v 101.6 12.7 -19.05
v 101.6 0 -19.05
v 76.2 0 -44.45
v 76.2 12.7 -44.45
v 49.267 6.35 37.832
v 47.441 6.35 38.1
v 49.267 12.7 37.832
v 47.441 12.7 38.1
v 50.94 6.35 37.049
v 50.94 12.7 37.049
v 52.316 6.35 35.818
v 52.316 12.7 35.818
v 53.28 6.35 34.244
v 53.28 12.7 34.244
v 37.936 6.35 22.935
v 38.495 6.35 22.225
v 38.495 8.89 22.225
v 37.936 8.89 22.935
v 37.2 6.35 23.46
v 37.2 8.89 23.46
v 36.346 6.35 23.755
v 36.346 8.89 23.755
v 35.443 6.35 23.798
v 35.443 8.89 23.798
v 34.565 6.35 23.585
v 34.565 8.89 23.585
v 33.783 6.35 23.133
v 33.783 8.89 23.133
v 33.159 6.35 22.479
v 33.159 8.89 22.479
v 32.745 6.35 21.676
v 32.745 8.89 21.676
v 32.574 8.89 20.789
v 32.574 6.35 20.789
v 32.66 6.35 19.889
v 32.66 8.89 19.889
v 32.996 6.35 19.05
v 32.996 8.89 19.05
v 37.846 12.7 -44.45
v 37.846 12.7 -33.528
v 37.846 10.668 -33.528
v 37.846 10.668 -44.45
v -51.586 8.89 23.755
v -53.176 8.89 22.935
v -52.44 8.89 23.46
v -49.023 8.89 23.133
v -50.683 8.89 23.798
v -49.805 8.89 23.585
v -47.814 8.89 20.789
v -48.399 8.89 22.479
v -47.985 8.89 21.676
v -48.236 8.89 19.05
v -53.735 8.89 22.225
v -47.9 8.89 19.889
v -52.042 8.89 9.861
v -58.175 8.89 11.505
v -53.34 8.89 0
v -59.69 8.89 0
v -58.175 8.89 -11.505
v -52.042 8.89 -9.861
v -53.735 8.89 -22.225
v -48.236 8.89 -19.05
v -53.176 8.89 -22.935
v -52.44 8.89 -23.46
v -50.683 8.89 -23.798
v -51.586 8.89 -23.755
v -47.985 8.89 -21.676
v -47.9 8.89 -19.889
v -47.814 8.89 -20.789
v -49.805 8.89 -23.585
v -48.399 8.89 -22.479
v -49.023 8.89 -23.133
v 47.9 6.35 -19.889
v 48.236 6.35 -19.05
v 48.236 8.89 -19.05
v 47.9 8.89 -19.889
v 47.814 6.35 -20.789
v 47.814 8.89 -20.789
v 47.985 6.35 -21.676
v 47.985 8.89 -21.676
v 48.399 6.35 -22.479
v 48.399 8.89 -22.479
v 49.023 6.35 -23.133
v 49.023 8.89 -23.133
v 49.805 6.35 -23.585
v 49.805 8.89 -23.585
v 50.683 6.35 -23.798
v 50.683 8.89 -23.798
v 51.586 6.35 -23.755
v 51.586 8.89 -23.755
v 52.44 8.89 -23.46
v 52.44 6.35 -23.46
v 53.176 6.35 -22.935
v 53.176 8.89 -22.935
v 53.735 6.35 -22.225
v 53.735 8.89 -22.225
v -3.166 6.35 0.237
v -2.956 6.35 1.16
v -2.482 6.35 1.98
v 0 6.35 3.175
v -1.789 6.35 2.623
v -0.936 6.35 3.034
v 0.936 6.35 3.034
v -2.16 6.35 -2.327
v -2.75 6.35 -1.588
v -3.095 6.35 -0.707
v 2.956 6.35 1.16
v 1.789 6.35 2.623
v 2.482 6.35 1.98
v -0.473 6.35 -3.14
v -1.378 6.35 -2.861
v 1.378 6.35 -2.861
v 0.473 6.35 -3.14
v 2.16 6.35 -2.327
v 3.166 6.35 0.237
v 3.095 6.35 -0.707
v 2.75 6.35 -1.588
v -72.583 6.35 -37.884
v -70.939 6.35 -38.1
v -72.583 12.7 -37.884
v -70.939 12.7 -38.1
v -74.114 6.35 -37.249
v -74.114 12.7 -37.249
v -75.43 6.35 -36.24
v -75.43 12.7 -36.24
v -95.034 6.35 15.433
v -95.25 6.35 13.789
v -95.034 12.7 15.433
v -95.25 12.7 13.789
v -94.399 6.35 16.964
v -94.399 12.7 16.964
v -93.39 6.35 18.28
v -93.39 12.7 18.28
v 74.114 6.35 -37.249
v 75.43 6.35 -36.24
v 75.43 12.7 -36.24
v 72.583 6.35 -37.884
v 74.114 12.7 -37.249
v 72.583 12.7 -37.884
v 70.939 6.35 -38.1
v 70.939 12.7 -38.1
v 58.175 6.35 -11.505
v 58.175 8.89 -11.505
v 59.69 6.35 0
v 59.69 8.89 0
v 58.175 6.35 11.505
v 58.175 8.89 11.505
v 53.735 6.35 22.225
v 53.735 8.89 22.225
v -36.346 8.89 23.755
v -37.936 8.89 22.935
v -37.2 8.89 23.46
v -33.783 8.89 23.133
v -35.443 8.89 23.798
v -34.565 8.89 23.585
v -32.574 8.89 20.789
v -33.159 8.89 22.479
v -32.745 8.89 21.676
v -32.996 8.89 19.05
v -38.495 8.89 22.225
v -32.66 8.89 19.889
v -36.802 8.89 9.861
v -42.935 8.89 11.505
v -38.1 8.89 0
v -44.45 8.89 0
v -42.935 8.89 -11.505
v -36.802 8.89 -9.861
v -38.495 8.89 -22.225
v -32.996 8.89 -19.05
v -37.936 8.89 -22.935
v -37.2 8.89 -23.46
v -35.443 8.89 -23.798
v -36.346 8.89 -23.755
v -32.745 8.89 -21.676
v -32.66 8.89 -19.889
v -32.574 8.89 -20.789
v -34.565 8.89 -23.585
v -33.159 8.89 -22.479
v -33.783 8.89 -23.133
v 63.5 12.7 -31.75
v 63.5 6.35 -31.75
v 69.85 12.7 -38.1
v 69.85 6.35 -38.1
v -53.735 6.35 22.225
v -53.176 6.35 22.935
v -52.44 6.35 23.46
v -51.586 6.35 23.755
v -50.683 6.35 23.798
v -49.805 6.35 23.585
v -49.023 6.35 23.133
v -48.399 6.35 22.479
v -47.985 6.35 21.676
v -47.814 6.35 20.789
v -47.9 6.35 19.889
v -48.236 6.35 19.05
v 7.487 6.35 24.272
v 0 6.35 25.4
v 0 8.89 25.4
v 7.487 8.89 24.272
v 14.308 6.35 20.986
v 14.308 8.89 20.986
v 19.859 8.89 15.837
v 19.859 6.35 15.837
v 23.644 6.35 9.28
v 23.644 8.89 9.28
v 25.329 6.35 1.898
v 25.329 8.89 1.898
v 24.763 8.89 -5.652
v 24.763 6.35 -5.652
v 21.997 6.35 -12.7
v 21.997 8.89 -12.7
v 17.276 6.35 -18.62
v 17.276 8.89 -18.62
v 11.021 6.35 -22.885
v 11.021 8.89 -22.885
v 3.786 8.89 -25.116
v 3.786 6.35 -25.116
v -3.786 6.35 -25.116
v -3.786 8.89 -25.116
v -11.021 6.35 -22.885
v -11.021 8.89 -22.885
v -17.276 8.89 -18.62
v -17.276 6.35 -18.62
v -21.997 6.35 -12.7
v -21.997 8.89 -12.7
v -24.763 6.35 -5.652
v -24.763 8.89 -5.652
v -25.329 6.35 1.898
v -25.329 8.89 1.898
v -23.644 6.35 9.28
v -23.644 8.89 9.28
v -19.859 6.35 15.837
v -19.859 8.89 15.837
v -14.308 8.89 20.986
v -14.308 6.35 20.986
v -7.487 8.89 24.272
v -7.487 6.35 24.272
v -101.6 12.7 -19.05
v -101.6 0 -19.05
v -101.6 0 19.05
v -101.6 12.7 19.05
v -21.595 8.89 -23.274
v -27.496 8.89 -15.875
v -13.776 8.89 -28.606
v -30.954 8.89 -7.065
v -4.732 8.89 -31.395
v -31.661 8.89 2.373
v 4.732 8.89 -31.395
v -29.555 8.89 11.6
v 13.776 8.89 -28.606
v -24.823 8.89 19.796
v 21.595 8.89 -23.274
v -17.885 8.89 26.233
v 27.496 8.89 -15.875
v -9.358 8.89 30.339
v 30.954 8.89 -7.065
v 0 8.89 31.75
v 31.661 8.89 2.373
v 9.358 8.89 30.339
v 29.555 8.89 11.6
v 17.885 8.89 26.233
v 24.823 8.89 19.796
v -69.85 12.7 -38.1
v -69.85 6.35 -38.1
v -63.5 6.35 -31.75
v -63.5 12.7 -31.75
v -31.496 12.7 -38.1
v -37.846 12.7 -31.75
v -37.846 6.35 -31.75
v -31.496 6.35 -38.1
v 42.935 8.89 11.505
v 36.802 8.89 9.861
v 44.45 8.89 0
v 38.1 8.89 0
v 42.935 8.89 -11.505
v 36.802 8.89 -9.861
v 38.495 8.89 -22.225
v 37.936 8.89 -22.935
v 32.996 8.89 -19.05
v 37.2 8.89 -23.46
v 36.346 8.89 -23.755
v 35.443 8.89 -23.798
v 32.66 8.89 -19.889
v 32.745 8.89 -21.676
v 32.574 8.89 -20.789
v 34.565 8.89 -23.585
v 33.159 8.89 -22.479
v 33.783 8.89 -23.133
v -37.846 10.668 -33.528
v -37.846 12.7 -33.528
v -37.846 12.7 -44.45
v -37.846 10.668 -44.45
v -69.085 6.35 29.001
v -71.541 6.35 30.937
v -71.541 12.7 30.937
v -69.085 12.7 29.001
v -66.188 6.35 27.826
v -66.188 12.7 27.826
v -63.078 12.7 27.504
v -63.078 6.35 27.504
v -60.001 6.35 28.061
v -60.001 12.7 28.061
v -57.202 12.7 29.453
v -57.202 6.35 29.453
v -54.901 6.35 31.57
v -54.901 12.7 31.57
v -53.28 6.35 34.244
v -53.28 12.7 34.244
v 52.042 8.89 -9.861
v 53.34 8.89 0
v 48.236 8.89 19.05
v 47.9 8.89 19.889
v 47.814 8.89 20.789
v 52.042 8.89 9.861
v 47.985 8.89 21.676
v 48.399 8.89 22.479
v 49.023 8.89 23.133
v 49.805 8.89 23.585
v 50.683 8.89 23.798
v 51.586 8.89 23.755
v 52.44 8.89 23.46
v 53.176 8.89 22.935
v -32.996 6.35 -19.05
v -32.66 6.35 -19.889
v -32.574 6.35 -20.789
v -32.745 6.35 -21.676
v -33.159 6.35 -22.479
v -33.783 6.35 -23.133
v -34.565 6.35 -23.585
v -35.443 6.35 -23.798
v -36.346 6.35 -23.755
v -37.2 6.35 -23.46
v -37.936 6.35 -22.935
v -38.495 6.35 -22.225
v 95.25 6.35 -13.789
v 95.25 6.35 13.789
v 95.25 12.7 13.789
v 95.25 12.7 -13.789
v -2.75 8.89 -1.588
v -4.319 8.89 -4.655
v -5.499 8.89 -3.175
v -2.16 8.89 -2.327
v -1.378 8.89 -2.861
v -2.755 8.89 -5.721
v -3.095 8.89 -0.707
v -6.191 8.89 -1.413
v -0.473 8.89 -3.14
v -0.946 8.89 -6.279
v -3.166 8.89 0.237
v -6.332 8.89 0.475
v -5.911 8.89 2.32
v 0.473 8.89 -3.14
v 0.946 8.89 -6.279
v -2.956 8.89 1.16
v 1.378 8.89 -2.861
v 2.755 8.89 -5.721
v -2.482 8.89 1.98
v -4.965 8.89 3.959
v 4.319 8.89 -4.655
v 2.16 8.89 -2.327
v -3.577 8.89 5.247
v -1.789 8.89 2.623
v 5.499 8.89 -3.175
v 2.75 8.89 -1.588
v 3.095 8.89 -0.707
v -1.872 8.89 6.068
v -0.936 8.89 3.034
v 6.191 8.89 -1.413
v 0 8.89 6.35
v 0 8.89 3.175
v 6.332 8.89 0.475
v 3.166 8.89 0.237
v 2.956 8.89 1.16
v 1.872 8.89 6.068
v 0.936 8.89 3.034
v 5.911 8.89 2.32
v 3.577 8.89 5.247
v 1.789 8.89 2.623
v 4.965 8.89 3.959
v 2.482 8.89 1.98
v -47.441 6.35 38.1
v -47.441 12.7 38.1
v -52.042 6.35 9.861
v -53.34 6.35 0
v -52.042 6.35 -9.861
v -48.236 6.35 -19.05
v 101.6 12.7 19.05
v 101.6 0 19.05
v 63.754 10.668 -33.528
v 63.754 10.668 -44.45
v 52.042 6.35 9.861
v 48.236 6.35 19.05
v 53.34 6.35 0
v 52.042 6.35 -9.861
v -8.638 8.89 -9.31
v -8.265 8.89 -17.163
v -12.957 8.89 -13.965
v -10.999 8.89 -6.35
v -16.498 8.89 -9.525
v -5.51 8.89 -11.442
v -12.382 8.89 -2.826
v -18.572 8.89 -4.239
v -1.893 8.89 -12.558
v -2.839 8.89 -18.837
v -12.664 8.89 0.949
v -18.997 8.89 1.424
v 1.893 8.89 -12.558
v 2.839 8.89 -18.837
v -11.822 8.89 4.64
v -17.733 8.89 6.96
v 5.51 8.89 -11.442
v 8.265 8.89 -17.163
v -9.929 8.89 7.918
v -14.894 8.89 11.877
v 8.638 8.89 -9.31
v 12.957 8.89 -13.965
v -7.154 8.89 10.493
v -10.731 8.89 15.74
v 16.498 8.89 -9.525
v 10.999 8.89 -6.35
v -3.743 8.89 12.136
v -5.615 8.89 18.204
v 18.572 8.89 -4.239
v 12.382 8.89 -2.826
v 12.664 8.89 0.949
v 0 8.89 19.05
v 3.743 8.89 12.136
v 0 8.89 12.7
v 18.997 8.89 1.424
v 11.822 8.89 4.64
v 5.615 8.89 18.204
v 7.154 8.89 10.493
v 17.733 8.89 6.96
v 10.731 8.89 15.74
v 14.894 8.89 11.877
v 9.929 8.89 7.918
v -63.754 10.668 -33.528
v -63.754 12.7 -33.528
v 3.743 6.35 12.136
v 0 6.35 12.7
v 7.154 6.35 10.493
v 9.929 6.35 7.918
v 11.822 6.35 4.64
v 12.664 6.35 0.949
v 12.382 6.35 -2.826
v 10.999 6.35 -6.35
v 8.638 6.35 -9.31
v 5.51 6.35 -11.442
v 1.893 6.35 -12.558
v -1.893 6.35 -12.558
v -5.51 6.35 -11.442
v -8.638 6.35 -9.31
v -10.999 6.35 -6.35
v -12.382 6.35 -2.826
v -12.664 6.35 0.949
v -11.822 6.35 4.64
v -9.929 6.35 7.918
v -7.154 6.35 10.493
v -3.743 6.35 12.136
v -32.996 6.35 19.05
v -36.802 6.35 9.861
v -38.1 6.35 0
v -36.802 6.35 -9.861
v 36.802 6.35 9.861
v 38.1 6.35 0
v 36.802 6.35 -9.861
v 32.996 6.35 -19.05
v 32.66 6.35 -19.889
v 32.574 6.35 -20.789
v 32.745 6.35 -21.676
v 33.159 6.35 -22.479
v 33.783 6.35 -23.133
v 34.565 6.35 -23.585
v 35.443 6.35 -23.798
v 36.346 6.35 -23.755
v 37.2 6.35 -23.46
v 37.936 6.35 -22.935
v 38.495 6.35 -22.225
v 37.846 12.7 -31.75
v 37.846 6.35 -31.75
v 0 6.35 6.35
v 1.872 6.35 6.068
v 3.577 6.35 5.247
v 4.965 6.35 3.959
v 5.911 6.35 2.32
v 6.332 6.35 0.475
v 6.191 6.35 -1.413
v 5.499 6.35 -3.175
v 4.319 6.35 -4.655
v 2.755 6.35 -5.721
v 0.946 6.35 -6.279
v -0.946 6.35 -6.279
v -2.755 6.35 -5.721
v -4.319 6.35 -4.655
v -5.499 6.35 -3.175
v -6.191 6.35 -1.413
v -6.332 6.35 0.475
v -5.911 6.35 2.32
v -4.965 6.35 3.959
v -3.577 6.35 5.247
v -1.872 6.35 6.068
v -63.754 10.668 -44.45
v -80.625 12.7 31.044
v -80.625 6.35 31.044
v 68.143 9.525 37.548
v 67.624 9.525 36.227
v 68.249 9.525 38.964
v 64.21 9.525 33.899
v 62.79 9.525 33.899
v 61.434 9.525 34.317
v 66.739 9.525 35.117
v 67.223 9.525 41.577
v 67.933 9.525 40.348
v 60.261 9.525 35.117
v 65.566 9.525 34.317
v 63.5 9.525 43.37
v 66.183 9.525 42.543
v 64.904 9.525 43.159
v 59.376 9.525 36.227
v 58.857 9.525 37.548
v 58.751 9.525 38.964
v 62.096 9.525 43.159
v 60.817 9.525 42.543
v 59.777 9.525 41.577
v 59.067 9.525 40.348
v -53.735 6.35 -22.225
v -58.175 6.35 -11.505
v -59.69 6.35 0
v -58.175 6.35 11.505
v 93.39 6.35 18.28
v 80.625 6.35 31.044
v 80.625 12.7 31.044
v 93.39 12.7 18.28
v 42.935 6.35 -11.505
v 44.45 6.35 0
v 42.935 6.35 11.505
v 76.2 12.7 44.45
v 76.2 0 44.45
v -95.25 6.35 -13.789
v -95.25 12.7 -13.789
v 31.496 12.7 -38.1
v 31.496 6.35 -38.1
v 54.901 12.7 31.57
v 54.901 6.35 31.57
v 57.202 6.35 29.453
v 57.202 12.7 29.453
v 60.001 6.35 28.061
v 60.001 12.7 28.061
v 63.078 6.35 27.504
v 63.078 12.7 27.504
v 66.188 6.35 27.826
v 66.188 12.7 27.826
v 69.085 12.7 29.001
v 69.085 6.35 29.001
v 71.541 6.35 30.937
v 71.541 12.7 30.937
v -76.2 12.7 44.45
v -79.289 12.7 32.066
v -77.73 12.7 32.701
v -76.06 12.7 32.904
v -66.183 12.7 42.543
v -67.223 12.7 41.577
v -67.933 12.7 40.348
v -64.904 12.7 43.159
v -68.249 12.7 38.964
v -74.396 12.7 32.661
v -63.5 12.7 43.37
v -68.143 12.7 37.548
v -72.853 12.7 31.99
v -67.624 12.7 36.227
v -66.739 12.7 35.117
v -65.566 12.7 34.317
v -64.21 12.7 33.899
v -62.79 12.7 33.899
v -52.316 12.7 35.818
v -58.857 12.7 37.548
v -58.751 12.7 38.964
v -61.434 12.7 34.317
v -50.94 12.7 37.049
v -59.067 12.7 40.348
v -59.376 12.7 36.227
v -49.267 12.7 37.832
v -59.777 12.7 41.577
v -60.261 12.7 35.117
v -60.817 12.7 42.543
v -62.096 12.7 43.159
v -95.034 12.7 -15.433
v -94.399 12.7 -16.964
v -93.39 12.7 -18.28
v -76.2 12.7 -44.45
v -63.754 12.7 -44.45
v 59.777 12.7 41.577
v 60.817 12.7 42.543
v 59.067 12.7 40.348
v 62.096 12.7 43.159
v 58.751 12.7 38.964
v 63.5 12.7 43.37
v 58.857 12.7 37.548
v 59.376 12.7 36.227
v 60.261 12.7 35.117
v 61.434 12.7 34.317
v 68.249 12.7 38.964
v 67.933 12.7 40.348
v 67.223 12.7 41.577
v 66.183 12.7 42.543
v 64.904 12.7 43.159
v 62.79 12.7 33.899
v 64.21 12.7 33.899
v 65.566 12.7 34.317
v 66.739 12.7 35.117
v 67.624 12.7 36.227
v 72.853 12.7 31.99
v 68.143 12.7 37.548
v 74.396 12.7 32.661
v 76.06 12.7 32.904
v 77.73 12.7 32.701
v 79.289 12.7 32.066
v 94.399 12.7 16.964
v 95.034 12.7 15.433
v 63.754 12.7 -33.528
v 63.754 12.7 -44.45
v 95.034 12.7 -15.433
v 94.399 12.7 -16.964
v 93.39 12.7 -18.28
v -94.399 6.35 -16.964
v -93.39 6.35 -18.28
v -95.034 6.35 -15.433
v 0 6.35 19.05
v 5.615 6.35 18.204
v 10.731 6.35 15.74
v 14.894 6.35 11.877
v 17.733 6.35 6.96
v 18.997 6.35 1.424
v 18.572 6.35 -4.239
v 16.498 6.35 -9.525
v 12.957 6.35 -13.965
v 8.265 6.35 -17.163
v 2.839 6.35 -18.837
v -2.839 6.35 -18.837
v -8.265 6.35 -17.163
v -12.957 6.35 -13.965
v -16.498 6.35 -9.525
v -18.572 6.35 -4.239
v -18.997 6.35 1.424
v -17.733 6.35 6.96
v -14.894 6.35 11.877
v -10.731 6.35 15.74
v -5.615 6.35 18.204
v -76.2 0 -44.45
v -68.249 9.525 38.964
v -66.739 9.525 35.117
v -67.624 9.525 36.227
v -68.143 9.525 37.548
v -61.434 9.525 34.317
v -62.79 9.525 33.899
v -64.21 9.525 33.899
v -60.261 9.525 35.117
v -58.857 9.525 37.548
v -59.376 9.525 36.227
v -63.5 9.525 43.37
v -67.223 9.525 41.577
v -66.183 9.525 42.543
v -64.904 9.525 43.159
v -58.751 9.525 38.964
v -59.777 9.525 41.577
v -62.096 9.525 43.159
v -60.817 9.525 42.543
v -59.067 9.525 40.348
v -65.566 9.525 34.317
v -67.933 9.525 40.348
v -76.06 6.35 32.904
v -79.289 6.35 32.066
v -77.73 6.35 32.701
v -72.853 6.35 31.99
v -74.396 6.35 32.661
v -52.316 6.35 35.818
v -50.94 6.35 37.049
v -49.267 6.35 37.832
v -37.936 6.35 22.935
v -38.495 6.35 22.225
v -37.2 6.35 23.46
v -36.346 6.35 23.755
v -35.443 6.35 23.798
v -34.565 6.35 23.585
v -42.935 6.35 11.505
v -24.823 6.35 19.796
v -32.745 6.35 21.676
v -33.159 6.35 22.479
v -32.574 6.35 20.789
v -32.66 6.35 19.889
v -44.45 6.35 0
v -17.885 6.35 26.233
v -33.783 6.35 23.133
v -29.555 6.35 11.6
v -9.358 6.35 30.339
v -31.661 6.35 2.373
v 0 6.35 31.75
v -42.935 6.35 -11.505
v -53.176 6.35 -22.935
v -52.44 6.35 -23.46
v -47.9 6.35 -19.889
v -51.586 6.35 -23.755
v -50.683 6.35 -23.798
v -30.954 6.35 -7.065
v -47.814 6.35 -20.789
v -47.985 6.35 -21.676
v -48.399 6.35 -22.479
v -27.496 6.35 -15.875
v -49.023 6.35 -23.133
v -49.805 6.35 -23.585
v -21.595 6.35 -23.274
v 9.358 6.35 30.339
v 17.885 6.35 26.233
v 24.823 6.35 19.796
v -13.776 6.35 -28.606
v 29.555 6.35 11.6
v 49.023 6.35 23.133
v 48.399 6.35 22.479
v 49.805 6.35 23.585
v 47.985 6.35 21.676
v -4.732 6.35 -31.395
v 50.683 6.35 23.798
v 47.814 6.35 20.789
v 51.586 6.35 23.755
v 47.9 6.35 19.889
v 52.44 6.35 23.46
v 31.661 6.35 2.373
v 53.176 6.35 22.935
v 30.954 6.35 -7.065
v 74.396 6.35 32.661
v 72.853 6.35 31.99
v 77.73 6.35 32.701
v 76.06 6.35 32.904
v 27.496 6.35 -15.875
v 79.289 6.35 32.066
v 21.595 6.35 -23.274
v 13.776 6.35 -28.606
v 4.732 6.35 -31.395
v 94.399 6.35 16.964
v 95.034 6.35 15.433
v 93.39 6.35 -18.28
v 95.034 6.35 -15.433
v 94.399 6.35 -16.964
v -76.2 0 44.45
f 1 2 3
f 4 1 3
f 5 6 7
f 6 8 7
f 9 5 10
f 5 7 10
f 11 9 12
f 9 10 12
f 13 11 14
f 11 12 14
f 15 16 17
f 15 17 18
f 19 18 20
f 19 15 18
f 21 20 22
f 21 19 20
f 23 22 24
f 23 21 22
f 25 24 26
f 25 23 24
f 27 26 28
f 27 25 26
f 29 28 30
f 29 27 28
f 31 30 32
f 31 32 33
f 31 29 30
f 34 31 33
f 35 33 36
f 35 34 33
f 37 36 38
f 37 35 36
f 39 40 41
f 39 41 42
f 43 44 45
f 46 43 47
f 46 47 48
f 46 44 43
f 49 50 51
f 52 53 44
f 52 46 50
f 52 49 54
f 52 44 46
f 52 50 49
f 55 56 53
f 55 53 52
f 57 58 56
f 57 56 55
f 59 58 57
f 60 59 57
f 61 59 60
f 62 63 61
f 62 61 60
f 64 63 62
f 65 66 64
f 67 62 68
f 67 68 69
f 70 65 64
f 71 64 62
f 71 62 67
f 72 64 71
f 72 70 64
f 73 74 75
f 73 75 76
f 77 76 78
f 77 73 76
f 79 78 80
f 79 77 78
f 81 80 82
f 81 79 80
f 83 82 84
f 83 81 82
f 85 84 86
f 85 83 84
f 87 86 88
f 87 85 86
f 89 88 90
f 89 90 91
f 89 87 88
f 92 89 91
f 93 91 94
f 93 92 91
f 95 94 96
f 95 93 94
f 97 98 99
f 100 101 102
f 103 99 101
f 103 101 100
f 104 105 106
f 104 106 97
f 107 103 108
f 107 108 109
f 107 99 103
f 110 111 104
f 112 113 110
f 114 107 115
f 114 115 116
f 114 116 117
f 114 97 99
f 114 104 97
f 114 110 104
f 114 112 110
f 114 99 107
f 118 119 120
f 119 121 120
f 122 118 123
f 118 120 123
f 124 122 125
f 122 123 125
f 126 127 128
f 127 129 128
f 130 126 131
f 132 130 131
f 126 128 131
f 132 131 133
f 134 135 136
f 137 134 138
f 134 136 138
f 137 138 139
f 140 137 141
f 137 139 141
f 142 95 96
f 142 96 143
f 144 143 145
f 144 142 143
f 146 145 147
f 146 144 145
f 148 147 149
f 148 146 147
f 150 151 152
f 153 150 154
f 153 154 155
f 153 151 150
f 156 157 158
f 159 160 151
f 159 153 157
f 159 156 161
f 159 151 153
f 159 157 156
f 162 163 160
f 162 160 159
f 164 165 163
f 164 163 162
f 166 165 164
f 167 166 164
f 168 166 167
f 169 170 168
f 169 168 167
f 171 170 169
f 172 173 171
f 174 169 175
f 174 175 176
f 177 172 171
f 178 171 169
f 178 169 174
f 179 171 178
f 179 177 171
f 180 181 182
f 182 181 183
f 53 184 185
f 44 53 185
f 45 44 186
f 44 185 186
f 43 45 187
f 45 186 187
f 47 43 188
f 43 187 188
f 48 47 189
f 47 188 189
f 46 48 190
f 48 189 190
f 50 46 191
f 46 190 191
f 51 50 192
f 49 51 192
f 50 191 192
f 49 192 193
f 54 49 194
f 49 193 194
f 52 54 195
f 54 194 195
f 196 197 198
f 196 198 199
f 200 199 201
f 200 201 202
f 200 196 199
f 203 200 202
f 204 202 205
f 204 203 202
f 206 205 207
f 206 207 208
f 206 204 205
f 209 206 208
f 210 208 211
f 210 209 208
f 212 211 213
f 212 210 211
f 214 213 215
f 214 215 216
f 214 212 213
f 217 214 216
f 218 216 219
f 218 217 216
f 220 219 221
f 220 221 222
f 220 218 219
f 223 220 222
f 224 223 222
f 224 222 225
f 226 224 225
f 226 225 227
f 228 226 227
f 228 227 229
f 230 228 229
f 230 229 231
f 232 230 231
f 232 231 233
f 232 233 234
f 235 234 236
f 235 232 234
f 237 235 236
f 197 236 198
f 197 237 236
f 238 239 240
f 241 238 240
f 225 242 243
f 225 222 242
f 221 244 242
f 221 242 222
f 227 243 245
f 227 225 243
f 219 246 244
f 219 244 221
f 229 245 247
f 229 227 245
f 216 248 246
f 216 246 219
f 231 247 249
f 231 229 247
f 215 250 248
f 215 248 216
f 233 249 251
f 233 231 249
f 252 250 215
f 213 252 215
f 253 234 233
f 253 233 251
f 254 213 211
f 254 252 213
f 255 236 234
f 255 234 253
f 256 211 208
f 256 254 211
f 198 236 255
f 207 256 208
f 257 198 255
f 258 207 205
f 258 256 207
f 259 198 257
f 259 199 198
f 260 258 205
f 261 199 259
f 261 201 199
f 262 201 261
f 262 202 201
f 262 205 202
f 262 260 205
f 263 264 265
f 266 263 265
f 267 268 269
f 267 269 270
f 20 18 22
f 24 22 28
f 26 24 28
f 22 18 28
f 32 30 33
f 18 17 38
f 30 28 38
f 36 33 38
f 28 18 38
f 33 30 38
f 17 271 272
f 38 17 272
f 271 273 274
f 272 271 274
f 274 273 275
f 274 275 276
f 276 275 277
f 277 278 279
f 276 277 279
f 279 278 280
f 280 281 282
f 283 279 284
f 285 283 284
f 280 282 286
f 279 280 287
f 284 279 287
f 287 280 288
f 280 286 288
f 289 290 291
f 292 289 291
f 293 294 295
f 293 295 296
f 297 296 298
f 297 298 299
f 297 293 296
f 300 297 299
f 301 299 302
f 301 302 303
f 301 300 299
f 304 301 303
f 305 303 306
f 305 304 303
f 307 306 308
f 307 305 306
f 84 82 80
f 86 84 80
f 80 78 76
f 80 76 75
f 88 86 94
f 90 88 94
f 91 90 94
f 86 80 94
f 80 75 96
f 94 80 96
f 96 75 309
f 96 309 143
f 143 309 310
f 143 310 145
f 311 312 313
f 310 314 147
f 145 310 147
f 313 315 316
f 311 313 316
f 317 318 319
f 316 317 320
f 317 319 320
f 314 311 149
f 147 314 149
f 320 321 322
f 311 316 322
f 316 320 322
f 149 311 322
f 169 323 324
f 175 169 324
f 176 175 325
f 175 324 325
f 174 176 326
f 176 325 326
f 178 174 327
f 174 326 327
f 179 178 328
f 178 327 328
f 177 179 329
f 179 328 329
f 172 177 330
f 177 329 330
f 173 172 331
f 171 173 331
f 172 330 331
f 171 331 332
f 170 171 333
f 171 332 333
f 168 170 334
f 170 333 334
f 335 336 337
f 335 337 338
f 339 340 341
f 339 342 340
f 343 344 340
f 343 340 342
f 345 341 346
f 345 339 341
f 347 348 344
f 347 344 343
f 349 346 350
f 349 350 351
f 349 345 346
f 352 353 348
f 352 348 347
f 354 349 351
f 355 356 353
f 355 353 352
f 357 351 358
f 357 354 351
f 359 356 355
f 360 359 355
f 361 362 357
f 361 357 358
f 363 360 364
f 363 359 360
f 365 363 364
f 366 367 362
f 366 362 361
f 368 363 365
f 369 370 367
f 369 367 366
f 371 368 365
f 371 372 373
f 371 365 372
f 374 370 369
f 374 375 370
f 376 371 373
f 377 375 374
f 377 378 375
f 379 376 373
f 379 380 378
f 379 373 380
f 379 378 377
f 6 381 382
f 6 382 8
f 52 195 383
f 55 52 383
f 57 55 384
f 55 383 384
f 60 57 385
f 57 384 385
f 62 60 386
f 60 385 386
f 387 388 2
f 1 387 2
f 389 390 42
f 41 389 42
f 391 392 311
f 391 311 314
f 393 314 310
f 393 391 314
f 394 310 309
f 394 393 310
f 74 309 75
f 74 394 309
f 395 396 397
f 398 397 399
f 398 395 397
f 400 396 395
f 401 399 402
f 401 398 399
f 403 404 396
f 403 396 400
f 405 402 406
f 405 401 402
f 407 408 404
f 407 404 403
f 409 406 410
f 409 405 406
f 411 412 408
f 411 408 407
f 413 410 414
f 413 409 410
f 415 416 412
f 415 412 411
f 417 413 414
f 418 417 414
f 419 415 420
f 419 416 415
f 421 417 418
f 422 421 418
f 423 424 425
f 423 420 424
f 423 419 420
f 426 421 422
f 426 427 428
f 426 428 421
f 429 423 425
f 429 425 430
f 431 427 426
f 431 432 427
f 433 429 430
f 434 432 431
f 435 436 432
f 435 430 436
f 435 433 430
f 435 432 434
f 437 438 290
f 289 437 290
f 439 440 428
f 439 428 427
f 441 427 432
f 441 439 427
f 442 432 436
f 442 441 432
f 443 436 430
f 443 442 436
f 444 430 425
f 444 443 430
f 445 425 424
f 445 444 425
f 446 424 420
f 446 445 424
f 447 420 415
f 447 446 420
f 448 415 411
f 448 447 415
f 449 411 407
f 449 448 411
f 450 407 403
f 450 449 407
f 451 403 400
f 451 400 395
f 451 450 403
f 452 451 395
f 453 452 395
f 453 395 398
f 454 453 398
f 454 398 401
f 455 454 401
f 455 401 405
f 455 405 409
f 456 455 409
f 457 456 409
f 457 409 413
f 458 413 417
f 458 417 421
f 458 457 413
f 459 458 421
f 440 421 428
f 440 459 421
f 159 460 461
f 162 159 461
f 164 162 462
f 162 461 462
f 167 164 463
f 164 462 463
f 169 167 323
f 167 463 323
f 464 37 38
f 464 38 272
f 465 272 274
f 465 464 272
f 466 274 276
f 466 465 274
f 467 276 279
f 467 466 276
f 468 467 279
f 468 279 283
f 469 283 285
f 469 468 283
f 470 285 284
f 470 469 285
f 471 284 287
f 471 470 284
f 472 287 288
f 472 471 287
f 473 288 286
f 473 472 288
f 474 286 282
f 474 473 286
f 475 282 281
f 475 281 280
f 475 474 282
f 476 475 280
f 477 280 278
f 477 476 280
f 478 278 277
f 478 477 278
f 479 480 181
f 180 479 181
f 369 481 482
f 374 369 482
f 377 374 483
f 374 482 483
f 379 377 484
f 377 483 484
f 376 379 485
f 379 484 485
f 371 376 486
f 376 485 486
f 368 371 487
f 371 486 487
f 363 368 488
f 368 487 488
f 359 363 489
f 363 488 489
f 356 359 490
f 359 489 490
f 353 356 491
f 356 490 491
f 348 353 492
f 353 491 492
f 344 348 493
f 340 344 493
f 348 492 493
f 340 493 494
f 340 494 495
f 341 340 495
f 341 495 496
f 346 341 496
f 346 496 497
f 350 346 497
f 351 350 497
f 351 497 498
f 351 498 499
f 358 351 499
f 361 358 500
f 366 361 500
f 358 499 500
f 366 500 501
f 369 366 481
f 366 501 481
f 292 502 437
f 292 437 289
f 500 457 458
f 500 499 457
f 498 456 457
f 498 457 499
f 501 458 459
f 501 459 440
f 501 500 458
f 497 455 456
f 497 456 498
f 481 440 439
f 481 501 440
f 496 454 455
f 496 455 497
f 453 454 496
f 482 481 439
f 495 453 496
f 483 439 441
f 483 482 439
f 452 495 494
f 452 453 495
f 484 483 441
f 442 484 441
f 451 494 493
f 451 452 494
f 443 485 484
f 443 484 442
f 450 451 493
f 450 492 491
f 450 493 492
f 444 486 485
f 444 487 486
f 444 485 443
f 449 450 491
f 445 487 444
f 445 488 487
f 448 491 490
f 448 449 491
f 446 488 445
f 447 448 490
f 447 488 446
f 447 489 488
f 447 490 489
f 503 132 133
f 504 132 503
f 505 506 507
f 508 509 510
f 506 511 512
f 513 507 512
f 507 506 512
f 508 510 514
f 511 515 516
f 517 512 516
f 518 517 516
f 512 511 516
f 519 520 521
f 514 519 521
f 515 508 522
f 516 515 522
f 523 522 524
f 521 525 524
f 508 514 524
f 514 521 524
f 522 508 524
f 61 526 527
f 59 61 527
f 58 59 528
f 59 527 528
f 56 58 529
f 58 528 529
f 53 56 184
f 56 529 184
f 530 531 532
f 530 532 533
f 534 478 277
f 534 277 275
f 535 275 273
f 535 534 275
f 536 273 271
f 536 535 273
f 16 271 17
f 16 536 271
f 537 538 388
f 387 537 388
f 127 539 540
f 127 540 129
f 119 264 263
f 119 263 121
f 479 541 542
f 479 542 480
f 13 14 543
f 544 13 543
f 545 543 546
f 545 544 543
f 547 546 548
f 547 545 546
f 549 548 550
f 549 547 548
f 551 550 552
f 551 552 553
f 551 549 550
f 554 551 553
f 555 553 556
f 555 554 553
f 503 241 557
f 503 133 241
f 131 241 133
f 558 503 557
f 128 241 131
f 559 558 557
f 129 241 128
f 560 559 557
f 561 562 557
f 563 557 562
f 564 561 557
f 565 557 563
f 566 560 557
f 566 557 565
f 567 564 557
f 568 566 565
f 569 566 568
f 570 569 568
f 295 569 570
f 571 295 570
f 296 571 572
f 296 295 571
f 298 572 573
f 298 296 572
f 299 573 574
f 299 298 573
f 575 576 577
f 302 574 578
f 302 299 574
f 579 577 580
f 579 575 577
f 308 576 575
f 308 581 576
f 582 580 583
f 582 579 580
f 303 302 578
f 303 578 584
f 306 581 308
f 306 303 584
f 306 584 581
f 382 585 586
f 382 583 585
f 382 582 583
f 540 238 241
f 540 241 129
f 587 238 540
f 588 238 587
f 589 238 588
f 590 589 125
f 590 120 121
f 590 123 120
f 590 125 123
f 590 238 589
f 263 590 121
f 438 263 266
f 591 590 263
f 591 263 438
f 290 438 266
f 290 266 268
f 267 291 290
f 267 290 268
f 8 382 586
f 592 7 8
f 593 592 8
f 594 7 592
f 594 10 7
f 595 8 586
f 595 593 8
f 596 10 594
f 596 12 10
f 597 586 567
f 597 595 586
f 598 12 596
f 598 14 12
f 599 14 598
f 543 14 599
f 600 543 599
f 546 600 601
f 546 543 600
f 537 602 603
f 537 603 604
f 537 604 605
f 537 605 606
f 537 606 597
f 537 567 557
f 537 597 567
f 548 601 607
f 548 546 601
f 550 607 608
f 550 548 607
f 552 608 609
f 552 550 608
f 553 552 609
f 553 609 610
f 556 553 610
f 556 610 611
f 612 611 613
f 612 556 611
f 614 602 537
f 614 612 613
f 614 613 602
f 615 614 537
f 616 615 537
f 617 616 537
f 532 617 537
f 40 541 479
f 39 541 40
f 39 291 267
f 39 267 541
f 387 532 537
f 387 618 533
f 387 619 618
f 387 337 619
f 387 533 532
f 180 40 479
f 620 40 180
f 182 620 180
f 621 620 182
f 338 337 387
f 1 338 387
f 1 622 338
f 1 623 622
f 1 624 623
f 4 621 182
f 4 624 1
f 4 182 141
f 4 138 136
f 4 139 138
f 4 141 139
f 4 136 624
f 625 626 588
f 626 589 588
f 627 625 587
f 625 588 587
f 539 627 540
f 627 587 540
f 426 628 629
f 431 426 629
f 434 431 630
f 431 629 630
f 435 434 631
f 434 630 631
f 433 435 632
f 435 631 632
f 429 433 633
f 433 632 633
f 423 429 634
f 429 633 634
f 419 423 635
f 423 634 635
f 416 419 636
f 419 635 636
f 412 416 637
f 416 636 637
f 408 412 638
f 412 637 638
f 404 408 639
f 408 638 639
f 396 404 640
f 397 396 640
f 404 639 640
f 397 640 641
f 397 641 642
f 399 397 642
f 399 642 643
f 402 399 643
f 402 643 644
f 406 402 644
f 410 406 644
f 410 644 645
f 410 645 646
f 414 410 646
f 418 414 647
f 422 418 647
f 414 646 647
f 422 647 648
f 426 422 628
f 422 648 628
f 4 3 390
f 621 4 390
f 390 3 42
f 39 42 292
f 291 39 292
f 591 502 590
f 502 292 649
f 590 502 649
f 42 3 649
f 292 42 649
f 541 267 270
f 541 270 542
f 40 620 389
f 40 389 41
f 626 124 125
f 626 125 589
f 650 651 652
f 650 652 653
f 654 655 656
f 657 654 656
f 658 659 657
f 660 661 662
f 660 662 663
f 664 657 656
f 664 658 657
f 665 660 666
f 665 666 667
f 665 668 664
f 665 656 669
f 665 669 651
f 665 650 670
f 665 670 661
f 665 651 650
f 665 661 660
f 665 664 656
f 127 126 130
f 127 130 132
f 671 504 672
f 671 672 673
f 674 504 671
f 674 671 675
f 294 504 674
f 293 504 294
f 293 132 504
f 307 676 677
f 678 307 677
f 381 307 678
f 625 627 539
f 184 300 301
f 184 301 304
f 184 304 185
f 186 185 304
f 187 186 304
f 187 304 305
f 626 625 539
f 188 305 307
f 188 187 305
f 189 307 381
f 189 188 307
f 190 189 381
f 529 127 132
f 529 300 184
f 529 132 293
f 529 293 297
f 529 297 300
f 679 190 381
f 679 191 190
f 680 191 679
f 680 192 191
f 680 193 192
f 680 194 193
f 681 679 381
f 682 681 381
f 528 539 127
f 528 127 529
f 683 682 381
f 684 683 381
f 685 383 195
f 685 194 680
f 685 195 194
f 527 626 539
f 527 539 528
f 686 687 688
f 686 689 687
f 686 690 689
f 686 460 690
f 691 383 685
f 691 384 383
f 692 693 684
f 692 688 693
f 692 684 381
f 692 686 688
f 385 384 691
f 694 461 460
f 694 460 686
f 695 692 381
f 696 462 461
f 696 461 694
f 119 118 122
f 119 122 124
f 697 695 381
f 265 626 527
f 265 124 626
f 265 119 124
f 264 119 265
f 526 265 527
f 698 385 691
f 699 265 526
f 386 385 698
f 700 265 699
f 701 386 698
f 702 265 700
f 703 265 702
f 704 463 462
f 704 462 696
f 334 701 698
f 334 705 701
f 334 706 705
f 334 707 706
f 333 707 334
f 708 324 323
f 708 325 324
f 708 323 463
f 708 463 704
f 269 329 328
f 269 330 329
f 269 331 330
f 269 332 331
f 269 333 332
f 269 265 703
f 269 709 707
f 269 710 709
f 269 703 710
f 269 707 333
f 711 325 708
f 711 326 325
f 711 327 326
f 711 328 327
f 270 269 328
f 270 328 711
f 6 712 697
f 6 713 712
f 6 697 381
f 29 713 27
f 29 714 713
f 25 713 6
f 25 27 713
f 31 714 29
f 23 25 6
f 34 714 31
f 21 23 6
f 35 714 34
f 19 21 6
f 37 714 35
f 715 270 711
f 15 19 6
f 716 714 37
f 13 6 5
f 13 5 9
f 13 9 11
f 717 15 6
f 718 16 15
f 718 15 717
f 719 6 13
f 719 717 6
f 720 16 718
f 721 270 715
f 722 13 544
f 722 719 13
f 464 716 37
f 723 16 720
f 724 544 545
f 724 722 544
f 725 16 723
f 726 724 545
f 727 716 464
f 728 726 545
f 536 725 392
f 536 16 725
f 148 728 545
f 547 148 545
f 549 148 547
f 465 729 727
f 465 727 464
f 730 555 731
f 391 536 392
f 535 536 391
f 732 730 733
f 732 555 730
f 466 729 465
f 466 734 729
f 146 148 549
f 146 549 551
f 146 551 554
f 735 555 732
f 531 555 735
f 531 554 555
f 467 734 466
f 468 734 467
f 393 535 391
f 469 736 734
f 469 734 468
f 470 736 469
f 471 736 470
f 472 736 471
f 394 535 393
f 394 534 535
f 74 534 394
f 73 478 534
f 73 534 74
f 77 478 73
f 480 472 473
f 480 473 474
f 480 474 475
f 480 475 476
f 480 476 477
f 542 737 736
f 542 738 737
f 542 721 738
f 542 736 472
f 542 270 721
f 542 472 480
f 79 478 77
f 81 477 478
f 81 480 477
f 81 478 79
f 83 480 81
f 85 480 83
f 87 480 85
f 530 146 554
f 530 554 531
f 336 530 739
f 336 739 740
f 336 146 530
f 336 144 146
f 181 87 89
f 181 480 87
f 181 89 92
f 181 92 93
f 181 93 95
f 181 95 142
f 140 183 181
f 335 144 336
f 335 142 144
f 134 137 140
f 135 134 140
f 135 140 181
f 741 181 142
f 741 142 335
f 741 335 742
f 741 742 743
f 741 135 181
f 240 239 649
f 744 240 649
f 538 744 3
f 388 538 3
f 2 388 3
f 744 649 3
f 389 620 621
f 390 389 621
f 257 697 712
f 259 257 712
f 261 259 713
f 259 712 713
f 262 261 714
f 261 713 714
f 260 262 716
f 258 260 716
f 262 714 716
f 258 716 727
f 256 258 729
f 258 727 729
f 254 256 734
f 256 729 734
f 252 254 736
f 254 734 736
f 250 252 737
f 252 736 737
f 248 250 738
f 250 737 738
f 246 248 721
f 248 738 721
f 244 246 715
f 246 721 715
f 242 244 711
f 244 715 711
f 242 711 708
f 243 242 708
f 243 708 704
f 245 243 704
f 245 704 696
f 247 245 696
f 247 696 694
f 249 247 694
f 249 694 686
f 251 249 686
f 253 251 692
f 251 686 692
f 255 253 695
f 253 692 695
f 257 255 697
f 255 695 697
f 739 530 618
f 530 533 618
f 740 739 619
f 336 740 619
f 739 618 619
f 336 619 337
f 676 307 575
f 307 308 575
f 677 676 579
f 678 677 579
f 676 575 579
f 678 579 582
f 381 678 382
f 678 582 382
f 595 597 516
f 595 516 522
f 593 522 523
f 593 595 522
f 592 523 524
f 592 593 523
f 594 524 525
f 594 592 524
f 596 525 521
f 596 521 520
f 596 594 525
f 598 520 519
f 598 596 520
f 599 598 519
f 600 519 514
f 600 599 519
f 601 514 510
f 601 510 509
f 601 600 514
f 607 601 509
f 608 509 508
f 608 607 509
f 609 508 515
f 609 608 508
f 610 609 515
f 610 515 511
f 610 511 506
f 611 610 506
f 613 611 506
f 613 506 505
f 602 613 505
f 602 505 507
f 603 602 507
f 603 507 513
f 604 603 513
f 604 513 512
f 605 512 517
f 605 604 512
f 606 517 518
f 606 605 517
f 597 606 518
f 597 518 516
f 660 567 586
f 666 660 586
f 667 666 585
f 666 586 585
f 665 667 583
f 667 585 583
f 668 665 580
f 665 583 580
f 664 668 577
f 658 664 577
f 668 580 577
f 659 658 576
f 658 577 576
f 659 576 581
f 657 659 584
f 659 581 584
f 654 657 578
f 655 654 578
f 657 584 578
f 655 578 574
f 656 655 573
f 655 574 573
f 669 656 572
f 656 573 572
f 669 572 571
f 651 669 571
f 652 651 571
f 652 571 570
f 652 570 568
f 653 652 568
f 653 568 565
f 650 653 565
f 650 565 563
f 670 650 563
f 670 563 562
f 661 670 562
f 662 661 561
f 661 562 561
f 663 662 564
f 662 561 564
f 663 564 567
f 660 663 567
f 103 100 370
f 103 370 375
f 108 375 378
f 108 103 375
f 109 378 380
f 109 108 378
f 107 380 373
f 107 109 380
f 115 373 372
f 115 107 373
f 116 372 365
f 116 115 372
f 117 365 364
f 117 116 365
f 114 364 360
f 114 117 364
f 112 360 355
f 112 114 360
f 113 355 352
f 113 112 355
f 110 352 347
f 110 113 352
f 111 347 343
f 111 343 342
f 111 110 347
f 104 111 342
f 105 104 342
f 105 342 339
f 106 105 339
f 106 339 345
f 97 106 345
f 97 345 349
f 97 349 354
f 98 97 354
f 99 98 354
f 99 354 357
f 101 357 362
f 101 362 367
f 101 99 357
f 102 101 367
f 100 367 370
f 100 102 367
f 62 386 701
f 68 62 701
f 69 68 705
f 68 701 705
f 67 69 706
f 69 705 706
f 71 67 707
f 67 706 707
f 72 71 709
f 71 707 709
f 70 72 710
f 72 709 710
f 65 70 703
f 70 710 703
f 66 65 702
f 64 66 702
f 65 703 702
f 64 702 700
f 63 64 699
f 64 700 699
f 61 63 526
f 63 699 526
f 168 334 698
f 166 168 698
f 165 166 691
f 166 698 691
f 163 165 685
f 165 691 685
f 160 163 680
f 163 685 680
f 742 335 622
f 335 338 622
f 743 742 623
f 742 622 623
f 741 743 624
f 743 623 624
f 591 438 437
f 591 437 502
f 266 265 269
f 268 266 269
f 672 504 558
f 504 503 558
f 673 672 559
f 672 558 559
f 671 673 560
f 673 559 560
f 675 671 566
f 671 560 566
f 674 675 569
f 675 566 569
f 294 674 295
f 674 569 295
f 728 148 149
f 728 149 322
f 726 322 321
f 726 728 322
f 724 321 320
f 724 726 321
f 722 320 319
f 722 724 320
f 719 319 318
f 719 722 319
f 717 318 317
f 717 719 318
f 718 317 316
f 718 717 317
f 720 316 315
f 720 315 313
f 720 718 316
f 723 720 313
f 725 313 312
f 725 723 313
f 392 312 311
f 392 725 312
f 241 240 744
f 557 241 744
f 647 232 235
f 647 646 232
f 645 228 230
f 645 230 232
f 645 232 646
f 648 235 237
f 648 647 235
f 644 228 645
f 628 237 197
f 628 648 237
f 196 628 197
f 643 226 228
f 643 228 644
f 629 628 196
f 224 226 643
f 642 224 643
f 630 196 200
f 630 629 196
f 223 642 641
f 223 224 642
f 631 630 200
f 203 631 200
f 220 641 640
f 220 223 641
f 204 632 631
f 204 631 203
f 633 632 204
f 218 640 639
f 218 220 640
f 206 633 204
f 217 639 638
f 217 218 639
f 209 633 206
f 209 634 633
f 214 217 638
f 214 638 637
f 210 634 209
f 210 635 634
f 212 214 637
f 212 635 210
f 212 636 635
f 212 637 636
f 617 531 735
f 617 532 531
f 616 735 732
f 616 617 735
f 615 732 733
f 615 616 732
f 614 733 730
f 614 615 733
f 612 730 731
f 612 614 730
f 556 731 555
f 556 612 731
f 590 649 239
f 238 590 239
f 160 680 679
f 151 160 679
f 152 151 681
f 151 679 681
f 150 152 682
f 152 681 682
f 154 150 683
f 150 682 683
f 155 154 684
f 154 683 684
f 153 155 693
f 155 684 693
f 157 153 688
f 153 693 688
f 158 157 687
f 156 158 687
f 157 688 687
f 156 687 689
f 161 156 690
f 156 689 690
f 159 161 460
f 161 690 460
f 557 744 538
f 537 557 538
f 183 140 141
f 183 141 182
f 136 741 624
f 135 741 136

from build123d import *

# Parameters (mm, degrees)
BOSS_EXTRUDE1_DEPTH  = 12.7
SKETCH2_R            = 4.7625
CUT_EXTRUDE1_DEPTH   = 3.175
SHELL2_START         = 6.35
SHELL2_DEPTH         = 6.35
FILLET3_R            = 6.35
BOSS_EXTRUDE2_DEPTH  = 6.35
CUT_EXTRUDE2_START   = 6.35
SKETCH4_W            = 25.908
SKETCH4_H            = 10.922
CUT_EXTRUDE2_DEPTH   = 2.032
CUT_EXTRUDE3_DEPTH   = 6.35
SKETCH6_R            = 31.75
SKETCH6_R_2          = 25.4
BOSS_EXTRUDE3_DEPTH  = 2.54
SKETCH7_R            = 19.05
SKETCH7_R_2          = 12.7
BOSS_EXTRUDE4_DEPTH  = 2.54
SKETCH8_R            = 6.35
SKETCH8_R_2          = 3.175
BOSS_EXTRUDE5_DEPTH  = 2.54
BOSS_EXTRUDE6_DEPTH  = 2.54
LPATTERN1_COUNT      = 2
LPATTERN1_PITCH      = 15.24
MIRROR3_COPY_1_DEPTH = 2.54


# Read off the part's stored shape, not the designer's step: Shell2
with BuildPart() as part:
    # Sketch1 → Boss-Extrude1 (new body)
    with BuildSketch(Plane(origin=(0, 0, 0), x_dir=(1, 0, 0), z_dir=(0, 1, 0))):
        Polygon((-76.2, 44.45), (-101.6, 19.05), (-101.6, -19.05), (-76.2, -44.45), (76.2, -44.45), (101.6, -19.05), (101.6, 19.05), (76.2, 44.45), align=None)
    extrude(amount=BOSS_EXTRUDE1_DEPTH)

    # Sketch2 → Cut-Extrude1 (cut)
    with BuildSketch(Plane(origin=(0, 12.7, 0), x_dir=(1, 0, 0), z_dir=(0, 1, 0))):
        with Locations(Location((-63.5, -38.608, 0), (0, 0, 270))):
            Circle(SKETCH2_R)
    cut_extrude1 = extrude(amount=-CUT_EXTRUDE1_DEPTH, mode=Mode.SUBTRACT)

    # Mirror1: Cut-Extrude1 across plane
    add(cut_extrude1.mirror(Plane(origin=(0, 0, 0), x_dir=(0, 0, 1), z_dir=(1, 0, 0))), mode=Mode.SUBTRACT)

    # Shell2 outline → Shell2 (cut)
    with BuildSketch(Plane(origin=(0, 0, 0), x_dir=(1, 0, 0), z_dir=(0, 1, 0)).offset(SHELL2_START)):
        with BuildLine():
            Line((74.516823481, -37.152920398), (95.25, -16.419743879))
            Line((95.25, -16.419743879), (95.25, 16.419743879))
            Line((95.25, 16.419743879), (73.569743879, 38.1))
            Line((73.569743879, 38.1), (-73.569743879, 38.1))
            Line((-73.569743879, 38.1), (-95.25, 16.419743879))
            Line((-95.25, 16.419743879), (-95.25, -16.419743879))
            Line((-95.25, -16.419743879), (-74.516823481, -37.152920398))
            ThreePointArc((-74.516823481, -37.152920398), (-63.024598672, -27.505673675), (-52.399117501, -38.1))
            Line((-52.399117501, -38.1), (52.399117501, -38.1))
            ThreePointArc((52.399117501, -38.1), (63.024598672, -27.505673675), (74.516823481, -37.152920398))
        make_face()
    extrude(amount=SHELL2_DEPTH, mode=Mode.SUBTRACT)

    # Fillet3
    fillet3_edges = [part.edges().sort_by_distance(p)[0] for p in [
        (95.25, 9.525, 16.419743879),
        (95.25, 9.525, -16.419743879),
        (73.569743879, 9.525, -38.1),
        (-73.569743879, 9.525, -38.1),
        (-95.25, 9.525, -16.419743879),
        (-95.25, 9.525, 16.419743879),
        (52.399117501, 9.525, 38.1),
        (-52.399117501, 9.525, 38.1),
        (-74.516823481, 9.525, 37.152920398),
        (74.516823481, 9.525, 37.152920398),
    ]]
    fillet(fillet3_edges, radius=FILLET3_R)

    # Sketch3 → Boss-Extrude2 (add)
    with BuildSketch(Plane(origin=(0, 6.35, 0), x_dir=(1, 0, 0), z_dir=(0, 1, 0))):
        Polygon((-76.2, 44.45), (-63.5, 31.75), (63.5, 31.75), (76.2, 44.45), align=None)
    extrude(amount=BOSS_EXTRUDE2_DEPTH)

    # Sketch4 → Cut-Extrude2 (cut)
    with BuildSketch(Plane(origin=(0, 6.35, 0), x_dir=(1, 0, 0), z_dir=(0, 1, 0)).offset(CUT_EXTRUDE2_START)):
        with Locations((-50.8, 38.989)):
            Rectangle(SKETCH4_W, SKETCH4_H)
    cut_extrude2 = extrude(amount=-CUT_EXTRUDE2_DEPTH, mode=Mode.SUBTRACT)

    # Mirror2: Cut-Extrude2 across plane
    add(cut_extrude2.mirror(Plane(origin=(0, 0, 0), x_dir=(0, 0, 1), z_dir=(1, 0, 0))), mode=Mode.SUBTRACT)

    # Sketch5 → Cut-Extrude3 (cut)
    with BuildSketch(Plane(origin=(0, 12.7, 0), x_dir=(1, 0, 0), z_dir=(0, 1, 0))):
        Polygon((-37.846, 31.75), (-31.496, 38.1), (31.496, 38.1), (37.846, 31.75), align=None)
    extrude(amount=-CUT_EXTRUDE3_DEPTH, mode=Mode.SUBTRACT)

    # Sketch6 → Boss-Extrude3 (add)
    with BuildSketch(Plane(origin=(0, 6.35, 0), x_dir=(1, 0, 0), z_dir=(0, 1, 0))):
        with Locations(Location((0, 0, 0), (0, 0, 270))):
            Circle(SKETCH6_R)
        with Locations(Location((0, 0, 0), (0, 0, 270))):
            Circle(SKETCH6_R_2, mode=Mode.SUBTRACT)
    extrude(amount=BOSS_EXTRUDE3_DEPTH)

    # Sketch7 → Boss-Extrude4 (add)
    with BuildSketch(Plane(origin=(0, 6.35, 0), x_dir=(1, 0, 0), z_dir=(0, 1, 0))):
        with Locations(Location((0, 0, 0), (0, 0, 270))):
            Circle(SKETCH7_R)
        with Locations(Location((0, 0, 0), (0, 0, 270))):
            Circle(SKETCH7_R_2, mode=Mode.SUBTRACT)
    extrude(amount=BOSS_EXTRUDE4_DEPTH)

    # Sketch8 → Boss-Extrude5 (add)
    with BuildSketch(Plane(origin=(0, 6.35, 0), x_dir=(1, 0, 0), z_dir=(0, 1, 0))):
        with Locations(Location((0, 0, 0), (0, 0, 270))):
            Circle(SKETCH8_R)
        with Locations(Location((0, 0, 0), (0, 0, 270))):
            Circle(SKETCH8_R_2, mode=Mode.SUBTRACT)
    extrude(amount=BOSS_EXTRUDE5_DEPTH)

    # Sketch9 → Boss-Extrude6 (add)
    with BuildSketch(Plane(origin=(0, 6.35, 0), x_dir=(1, 0, 0), z_dir=(0, 1, 0))):
        with BuildLine():
            ThreePointArc((-38.494829198, 22.225), (-44.45, 0), (-38.494829198, -22.225))
            ThreePointArc((-38.494829198, -22.225), (-34.157698541, -23.387130657), (-32.995567884, -19.05))
            ThreePointArc((-32.995567884, -19.05), (-38.1, 0), (-32.995567884, 19.05))
            ThreePointArc((-32.995567884, 19.05), (-34.157698541, 23.387130657), (-38.494829198, 22.225))
        make_face()
    boss_extrude6 = extrude(amount=BOSS_EXTRUDE6_DEPTH)

    # LPattern1: Boss-Extrude6 ×2
    with Locations(*[(-i * LPATTERN1_PITCH, 0, 0) for i in range(1, LPATTERN1_COUNT)]):
        add(boss_extrude6)

    # Mirror3: Boss-Extrude6 across plane
    add(boss_extrude6.mirror(Plane(origin=(0, 0, 0), x_dir=(0, 0, 1), z_dir=(1, 0, 0))))

    # Mirror3 copy 1 sketch → Mirror3 copy 1 (add)
    with BuildSketch(Plane(origin=(15.24, 6.35, 0), x_dir=(-1, 0, 0), z_dir=(0, 1, 0))):
        with BuildLine():
            ThreePointArc((-38.494829198, -22.225), (-44.45, 0), (-38.494829198, 22.225))
            ThreePointArc((-38.494829198, 22.225), (-34.157698541, 23.387130657), (-32.995567884, 19.05))
            ThreePointArc((-32.995567884, 19.05), (-38.1, 0), (-32.995567884, -19.05))
            ThreePointArc((-32.995567884, -19.05), (-34.157698541, -23.387130657), (-38.494829198, -22.225))
        make_face()
    extrude(amount=MIRROR3_COPY_1_DEPTH)


solid = part.part
